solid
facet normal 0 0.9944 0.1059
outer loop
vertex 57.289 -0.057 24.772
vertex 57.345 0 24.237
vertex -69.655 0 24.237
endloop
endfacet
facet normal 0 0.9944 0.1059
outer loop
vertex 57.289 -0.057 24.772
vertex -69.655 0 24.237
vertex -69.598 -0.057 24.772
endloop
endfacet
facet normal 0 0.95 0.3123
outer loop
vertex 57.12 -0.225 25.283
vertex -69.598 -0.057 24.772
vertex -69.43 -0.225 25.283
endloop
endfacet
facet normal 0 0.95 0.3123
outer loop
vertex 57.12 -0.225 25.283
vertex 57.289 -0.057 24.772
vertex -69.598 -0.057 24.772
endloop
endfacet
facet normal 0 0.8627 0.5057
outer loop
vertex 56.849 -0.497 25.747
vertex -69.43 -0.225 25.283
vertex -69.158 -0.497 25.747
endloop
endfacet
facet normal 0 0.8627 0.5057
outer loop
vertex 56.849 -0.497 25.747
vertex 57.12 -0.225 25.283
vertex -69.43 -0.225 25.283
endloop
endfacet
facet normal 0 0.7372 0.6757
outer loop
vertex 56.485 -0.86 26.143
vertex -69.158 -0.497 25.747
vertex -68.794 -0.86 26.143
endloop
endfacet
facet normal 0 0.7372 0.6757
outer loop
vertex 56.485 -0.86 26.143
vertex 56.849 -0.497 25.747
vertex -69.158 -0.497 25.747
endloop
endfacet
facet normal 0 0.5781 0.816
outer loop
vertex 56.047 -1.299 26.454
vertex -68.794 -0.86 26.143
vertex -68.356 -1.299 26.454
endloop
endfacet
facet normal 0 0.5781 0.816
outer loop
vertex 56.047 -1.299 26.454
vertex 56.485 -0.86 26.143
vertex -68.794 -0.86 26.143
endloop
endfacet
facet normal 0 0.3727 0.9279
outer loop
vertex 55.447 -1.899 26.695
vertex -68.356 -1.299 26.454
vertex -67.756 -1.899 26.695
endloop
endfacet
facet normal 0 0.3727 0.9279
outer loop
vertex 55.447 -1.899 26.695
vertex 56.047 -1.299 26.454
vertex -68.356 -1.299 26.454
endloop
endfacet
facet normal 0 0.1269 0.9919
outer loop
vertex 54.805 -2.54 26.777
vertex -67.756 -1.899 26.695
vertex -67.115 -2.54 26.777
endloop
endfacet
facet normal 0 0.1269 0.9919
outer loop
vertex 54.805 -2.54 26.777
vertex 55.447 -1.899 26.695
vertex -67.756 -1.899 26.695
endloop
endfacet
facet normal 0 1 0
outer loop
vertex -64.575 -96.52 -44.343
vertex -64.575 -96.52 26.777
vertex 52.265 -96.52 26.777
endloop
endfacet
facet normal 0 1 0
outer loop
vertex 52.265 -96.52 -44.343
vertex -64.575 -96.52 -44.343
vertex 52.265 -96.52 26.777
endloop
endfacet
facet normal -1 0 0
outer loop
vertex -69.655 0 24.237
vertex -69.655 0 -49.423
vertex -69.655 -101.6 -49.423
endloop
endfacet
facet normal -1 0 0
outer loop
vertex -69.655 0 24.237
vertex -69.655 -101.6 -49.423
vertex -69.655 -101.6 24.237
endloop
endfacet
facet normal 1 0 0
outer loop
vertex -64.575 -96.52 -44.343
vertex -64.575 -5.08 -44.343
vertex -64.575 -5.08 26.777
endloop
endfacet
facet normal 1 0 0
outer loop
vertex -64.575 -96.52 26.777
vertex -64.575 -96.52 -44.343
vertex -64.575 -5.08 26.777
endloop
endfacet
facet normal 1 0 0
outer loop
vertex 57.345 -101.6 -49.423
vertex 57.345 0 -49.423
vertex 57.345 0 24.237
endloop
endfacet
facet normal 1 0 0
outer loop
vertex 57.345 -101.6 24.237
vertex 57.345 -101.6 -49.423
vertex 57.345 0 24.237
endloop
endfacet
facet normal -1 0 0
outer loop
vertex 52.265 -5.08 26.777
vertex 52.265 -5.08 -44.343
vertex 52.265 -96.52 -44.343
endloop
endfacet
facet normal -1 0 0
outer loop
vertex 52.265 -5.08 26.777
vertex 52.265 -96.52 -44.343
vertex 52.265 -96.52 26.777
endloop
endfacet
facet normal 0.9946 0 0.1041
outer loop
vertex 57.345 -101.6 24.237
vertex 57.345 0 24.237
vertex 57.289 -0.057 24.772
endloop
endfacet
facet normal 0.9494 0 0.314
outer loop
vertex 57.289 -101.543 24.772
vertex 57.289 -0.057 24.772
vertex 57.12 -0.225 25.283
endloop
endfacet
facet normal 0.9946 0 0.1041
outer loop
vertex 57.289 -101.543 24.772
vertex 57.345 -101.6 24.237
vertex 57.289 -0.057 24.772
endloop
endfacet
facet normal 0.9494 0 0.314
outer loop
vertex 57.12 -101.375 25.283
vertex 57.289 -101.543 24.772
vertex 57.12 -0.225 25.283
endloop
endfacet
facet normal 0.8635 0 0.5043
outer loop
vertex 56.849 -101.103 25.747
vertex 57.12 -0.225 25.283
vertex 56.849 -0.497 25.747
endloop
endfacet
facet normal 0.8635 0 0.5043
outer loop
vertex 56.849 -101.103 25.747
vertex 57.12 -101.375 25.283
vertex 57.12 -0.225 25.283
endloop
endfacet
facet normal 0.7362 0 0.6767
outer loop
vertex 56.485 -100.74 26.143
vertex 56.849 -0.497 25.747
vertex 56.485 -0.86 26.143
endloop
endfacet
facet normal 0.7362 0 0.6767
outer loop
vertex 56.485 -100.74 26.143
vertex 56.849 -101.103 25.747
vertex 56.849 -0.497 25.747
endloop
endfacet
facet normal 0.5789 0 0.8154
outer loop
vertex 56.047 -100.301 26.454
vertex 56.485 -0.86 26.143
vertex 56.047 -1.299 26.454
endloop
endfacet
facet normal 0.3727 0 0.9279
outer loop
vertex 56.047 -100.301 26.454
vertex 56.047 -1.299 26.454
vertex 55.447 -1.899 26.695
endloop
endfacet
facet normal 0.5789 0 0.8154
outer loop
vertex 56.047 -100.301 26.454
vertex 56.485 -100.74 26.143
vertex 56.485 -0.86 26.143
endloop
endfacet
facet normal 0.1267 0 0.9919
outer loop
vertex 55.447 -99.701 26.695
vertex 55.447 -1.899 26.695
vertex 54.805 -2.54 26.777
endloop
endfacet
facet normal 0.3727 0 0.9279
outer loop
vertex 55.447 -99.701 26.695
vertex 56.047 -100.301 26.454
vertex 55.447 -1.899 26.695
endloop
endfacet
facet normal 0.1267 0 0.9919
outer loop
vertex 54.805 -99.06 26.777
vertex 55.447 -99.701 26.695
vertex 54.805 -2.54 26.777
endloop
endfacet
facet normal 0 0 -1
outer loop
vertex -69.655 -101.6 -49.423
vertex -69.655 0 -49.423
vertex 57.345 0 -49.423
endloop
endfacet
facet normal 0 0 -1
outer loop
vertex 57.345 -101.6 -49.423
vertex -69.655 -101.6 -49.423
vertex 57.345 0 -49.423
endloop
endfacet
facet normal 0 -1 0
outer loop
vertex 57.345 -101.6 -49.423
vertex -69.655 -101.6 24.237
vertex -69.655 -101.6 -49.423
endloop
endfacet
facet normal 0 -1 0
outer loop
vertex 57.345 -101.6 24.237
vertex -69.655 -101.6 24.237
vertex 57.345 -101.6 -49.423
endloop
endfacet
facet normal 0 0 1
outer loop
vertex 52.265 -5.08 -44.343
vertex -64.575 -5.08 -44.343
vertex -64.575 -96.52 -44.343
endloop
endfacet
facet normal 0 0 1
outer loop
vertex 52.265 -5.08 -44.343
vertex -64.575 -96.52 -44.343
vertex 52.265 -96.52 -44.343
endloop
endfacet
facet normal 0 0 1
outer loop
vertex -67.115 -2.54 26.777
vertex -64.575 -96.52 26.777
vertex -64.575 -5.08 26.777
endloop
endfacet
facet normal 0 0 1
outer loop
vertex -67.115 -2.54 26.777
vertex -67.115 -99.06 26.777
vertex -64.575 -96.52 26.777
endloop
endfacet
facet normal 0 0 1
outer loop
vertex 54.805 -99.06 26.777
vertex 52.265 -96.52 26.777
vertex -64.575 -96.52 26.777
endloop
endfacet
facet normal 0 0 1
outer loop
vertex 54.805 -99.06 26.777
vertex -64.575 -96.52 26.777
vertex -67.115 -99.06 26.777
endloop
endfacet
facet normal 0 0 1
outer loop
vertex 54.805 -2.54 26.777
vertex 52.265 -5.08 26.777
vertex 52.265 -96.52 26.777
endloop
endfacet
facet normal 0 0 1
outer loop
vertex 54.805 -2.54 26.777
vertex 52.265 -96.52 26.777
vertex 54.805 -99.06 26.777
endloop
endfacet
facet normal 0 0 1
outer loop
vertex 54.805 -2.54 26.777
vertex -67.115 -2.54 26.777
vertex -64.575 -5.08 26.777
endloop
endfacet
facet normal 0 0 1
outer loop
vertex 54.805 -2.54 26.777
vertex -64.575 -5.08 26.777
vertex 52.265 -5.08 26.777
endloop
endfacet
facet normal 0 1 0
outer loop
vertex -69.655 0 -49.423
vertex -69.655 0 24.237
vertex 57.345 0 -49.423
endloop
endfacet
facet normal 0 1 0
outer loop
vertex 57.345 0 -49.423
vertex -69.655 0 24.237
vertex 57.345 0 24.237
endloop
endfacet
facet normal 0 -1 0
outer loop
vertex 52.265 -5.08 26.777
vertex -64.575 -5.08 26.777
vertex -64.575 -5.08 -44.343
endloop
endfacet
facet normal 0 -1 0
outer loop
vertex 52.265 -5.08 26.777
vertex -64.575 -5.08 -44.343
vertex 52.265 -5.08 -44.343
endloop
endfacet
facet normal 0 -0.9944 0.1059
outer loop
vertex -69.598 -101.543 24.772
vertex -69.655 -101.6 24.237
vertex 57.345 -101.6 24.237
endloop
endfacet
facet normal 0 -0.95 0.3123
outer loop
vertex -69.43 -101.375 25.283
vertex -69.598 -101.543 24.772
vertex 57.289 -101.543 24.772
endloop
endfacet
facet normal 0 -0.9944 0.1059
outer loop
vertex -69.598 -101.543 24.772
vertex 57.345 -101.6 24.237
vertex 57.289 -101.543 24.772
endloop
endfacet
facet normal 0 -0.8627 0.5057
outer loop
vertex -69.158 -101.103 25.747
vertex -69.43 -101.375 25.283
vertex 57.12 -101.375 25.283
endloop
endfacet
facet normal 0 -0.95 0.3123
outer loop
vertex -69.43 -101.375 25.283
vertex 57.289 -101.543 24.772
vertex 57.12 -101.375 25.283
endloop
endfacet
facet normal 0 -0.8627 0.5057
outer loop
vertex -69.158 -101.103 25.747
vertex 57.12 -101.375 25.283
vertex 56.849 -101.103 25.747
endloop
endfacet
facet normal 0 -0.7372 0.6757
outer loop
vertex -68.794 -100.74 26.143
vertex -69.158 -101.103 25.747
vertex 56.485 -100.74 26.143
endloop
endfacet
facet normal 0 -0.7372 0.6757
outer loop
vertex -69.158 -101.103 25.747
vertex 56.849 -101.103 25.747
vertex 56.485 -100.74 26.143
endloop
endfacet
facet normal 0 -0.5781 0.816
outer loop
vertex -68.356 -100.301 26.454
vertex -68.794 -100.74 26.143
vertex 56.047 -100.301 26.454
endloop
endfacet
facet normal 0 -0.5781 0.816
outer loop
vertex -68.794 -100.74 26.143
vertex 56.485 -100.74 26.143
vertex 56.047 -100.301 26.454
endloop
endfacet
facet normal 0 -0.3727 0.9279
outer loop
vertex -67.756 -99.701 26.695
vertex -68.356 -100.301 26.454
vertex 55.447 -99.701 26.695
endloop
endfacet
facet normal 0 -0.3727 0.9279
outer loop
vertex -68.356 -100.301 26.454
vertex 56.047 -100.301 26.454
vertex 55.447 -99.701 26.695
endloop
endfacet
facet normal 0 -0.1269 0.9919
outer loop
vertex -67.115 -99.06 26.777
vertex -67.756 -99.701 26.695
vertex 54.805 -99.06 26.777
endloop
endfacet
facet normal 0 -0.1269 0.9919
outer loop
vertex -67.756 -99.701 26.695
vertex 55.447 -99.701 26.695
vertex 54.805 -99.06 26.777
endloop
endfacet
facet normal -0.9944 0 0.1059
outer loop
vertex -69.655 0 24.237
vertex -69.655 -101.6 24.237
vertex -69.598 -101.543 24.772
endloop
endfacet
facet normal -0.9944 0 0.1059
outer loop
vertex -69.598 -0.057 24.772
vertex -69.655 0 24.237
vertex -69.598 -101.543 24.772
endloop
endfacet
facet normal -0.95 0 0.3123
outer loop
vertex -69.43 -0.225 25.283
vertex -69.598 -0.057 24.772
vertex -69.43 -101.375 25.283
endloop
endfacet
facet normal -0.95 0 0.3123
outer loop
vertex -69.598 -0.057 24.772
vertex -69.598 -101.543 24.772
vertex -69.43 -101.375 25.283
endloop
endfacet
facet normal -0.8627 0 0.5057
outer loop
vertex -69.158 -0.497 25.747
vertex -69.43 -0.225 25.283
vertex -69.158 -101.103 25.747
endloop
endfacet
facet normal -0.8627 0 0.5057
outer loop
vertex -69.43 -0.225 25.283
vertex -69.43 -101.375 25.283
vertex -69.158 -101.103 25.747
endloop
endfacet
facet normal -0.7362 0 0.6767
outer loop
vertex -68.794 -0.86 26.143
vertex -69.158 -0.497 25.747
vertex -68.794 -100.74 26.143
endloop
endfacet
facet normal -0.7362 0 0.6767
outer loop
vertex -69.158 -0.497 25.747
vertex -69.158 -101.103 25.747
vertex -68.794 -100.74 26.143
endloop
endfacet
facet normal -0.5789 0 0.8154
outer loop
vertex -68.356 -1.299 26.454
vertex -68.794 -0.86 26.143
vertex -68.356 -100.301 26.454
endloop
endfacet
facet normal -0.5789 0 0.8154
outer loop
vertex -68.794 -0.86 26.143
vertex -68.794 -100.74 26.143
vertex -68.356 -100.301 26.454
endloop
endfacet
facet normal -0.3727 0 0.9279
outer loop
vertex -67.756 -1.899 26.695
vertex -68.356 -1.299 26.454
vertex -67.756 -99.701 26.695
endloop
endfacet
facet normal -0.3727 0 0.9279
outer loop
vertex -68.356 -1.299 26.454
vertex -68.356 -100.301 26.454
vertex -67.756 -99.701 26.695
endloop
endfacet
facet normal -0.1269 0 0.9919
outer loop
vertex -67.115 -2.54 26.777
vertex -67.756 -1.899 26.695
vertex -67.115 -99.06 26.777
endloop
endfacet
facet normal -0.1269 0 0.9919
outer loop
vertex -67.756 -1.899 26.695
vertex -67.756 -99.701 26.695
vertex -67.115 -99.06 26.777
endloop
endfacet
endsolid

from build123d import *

# Parameters (mm, degrees)
F0_W     = 127
F0_H     = 76.2
F1_DEPTH = 101.6
F2_T     = -5.08
F3_R     = 2.54


with BuildPart() as f1:
    # F0 (on Front) → F1 (new body)
    with BuildSketch(Plane.XZ):
        with Locations((-6.154592, -11.322558)):
            Rectangle(F0_W, F0_H)
    extrude(amount=F1_DEPTH)

    # F2
    f2_openings = [f1.faces().sort_by_distance(p)[0] for p in [
        (-6.154592, -50.8, 26.777442),
    ]]
    offset(amount=F2_T, openings=f2_openings)

    # F3
    f3_edges = [f1.edges().sort_by_distance(p)[0] for p in [
        (-6.154592, -101.6, 26.777442),
        (-69.654592, -50.8, 26.777442),
        (-6.154592, 0, 26.777442),
        (57.345408, -50.8, 26.777442),
    ]]
    fillet(f3_edges, radius=F3_R)


solid = f1.part
